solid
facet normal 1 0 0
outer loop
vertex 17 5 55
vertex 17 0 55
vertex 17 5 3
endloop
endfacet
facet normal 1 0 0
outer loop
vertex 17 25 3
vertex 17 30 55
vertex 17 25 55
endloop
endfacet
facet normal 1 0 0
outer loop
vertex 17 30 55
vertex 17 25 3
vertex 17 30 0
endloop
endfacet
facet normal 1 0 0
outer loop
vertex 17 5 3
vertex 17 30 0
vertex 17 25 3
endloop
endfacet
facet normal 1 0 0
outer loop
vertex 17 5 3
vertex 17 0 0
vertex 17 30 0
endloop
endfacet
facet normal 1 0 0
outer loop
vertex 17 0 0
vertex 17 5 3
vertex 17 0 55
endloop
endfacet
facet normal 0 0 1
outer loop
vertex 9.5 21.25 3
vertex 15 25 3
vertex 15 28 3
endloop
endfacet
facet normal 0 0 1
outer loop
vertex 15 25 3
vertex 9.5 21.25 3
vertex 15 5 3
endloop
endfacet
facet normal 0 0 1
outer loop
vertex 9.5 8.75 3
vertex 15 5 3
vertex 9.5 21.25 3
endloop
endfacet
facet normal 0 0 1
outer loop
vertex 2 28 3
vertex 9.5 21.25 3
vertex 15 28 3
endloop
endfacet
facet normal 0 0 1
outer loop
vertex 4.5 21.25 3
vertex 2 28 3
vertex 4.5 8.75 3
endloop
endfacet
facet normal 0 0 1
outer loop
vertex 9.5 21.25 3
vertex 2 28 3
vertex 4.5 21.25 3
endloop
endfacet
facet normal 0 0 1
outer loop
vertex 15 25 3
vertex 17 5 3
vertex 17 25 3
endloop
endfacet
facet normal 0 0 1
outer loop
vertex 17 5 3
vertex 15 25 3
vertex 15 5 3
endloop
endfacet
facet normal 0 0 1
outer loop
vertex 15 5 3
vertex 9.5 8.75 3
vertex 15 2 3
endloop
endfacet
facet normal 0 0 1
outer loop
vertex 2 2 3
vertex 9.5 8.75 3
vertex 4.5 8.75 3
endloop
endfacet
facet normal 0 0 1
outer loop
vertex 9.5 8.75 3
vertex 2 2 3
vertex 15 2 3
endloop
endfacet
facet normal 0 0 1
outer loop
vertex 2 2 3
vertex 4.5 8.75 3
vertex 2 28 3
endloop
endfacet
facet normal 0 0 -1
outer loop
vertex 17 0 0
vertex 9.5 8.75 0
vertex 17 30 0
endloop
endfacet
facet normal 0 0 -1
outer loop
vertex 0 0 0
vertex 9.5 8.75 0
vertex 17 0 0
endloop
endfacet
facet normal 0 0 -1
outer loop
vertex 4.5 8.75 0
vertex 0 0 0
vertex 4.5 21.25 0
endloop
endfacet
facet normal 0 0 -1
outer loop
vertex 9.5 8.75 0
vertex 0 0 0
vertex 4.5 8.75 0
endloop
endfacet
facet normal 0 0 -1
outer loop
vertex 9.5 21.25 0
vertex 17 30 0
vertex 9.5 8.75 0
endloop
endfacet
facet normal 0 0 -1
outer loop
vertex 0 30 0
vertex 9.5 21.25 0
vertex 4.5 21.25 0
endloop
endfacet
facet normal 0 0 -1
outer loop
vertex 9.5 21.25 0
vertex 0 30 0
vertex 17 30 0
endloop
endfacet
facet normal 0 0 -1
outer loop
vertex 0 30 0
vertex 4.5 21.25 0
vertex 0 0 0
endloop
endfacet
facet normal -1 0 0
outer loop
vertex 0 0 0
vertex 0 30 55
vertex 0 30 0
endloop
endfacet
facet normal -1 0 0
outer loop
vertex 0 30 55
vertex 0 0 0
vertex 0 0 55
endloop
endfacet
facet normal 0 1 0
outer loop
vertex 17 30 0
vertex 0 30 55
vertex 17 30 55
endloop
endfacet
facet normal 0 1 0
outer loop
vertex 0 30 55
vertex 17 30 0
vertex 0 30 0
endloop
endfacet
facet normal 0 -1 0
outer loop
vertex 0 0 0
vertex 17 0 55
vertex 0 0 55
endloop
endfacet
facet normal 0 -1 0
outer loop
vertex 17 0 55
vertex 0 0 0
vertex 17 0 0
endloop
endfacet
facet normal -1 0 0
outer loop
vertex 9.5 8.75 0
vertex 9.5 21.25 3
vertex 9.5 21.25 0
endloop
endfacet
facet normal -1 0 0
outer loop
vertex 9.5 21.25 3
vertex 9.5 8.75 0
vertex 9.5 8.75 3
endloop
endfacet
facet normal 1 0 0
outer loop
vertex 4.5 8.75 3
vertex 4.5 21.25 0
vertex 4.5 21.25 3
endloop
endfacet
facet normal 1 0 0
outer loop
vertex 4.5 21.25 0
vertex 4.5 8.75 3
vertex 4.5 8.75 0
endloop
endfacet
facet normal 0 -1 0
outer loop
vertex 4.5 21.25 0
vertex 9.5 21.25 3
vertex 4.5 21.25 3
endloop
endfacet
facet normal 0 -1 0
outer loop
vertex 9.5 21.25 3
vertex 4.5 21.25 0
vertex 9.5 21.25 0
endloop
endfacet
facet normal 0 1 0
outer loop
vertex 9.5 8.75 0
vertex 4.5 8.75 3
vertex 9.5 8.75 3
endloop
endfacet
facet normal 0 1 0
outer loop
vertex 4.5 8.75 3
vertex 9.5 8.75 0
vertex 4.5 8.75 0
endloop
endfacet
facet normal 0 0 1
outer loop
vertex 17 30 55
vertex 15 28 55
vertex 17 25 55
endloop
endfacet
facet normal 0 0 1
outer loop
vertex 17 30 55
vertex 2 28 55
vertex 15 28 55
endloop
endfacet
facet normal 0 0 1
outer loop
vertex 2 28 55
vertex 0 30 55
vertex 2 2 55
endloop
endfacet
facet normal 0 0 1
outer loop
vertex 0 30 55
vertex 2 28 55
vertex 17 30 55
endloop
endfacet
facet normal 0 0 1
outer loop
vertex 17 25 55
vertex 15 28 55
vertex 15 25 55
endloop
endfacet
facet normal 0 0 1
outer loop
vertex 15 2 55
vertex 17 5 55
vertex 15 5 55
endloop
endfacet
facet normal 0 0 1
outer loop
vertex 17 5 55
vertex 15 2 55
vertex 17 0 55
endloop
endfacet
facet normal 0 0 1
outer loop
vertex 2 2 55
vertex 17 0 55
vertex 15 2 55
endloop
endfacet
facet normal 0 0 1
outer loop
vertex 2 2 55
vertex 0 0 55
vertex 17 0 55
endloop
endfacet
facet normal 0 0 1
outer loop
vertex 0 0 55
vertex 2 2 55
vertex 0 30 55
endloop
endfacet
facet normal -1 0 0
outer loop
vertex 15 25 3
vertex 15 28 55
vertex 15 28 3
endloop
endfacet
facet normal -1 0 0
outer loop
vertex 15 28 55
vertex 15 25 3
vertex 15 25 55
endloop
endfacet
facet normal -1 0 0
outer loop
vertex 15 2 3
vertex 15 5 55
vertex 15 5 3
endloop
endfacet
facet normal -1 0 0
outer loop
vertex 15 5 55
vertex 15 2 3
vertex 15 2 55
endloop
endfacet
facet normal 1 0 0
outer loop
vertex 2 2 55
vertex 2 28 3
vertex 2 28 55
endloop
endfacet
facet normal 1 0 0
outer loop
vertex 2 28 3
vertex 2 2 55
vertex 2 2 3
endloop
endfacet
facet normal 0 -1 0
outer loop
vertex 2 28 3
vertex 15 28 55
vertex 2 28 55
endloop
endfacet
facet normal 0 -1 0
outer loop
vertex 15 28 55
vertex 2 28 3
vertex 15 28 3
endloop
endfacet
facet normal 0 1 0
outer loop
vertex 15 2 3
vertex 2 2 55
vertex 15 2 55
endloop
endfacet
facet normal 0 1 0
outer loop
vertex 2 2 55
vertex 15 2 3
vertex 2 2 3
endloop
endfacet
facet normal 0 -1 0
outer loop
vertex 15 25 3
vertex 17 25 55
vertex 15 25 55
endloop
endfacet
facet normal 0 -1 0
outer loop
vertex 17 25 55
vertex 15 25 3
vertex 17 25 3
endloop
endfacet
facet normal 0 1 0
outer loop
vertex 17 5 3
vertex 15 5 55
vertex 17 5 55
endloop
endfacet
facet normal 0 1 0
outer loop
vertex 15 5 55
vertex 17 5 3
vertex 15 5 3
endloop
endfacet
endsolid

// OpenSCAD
/*
Sonoff Zigbee Wall Mount
(C) 2024 - nomike[at]nomike[dot]com

This program is free software: you can redistribute it and/or modify
it under the terms of the GNU General Public License as published by
the Free Software Foundation, either version 3 of the License, or
(at your option) any later version.

This program is distributed in the hope that it will be useful,
but WITHOUT ANY WARRANTY; without even the implied warranty of
MERCHANTABILITY or FITNESS FOR A PARTICULAR PURPOSE.  See the
GNU General Public License for more details.

You should have received a copy of the GNU General Public License
along with this program.  If not, see <https://www.gnu.org/licenses/>.
*/

inner_width = 13;
inner_length = 26;
inner_height = 52;
base_height = 3;
wall_strength = 2;
usb_offset_y = 0; // 3
usb_offset_x = -1.5; // 0
usb_cutout_width = 5;
usb_cutout_length = 12.5;

outer_width = inner_width + (2 * wall_strength);
outer_length = inner_length + (2 * wall_strength);
front_slit_length = 20;

union() {
    difference() {
        translate([
            0,
            0,
            0
        ])
        cube([
            outer_width,
            outer_length,
            base_height
        ]);
        
        translate([
            ((outer_width - usb_cutout_width) / 2) + usb_offset_x,
            ((outer_length - usb_cutout_length) / 2) + usb_offset_y,
            0
        ])
        cube([
            usb_cutout_width,
            usb_cutout_length,
            base_height
        ]);
    }
    difference() {
        translate([0, 0, base_height]) cube([inner_width + (2 * wall_strength), inner_length + (2 * wall_strength), inner_height]);
        translate([wall_strength, wall_strength, base_height]) cube([inner_width, inner_length, inner_height]);
        translate([outer_width - wall_strength, (outer_length - front_slit_length) / 2, base_height]) cube([wall_strength, front_slit_length, inner_height]);

    }
}
